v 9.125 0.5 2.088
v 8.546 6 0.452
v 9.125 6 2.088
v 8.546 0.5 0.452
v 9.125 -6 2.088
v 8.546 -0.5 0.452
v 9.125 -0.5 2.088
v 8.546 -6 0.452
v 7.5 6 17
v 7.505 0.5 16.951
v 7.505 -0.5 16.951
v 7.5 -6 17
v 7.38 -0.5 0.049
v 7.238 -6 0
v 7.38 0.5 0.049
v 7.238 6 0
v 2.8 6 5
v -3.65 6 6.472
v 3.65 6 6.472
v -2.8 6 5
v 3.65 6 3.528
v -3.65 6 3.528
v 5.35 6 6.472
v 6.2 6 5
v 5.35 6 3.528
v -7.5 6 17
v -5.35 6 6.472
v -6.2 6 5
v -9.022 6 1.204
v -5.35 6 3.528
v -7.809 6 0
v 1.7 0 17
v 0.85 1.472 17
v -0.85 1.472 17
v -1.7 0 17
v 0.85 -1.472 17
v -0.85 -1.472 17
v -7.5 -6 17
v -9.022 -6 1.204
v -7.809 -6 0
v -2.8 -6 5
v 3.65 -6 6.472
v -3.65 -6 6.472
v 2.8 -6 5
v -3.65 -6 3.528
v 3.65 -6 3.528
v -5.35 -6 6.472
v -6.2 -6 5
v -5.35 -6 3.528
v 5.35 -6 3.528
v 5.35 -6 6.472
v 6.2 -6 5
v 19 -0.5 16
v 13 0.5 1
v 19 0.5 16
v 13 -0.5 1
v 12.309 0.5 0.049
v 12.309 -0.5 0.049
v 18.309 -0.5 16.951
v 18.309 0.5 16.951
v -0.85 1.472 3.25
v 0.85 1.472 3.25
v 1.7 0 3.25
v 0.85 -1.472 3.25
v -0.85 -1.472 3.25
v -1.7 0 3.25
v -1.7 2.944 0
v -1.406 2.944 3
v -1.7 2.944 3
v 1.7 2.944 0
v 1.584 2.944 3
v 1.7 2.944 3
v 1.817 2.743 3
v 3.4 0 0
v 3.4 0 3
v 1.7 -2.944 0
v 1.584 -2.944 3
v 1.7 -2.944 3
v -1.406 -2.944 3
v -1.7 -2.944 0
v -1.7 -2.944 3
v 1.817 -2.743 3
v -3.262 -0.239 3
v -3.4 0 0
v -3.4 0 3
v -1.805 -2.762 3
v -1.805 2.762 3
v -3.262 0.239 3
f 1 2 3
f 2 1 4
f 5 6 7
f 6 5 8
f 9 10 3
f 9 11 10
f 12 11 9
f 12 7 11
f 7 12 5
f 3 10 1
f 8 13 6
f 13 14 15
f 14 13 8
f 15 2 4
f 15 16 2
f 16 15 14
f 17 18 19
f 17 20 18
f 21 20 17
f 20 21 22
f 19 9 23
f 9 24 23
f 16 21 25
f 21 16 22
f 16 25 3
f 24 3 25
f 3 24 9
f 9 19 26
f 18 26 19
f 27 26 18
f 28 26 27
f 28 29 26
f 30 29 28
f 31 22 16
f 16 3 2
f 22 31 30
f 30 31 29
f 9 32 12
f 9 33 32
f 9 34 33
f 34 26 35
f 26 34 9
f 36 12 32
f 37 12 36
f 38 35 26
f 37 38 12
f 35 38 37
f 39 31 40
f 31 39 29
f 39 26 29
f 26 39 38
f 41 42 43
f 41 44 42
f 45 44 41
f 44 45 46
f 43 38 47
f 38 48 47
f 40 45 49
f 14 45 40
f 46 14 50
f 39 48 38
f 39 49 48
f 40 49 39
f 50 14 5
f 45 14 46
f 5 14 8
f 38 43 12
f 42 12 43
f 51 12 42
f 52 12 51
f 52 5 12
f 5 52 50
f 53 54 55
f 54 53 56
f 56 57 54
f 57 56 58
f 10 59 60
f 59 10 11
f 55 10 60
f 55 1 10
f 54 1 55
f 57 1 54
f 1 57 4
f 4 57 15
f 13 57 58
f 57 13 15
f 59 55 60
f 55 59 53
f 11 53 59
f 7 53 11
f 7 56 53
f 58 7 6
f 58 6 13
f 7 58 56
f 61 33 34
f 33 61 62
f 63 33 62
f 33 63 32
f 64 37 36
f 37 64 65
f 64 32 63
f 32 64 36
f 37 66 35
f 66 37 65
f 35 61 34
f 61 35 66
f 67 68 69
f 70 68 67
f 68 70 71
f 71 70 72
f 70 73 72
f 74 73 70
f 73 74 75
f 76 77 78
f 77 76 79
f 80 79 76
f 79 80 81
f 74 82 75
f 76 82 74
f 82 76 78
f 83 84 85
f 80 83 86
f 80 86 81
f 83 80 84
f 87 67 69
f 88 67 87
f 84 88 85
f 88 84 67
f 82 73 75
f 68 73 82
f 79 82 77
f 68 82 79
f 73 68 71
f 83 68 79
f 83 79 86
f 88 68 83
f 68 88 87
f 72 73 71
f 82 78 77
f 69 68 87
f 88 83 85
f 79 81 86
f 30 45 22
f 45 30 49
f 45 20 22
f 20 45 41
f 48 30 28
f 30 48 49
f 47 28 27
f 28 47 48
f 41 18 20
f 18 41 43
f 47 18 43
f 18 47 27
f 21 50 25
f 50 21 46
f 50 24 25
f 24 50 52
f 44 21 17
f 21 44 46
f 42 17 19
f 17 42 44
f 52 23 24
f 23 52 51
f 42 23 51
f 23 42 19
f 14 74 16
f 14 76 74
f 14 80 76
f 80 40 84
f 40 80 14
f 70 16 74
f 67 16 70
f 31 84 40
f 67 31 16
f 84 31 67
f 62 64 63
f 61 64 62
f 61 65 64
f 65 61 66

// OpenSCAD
// file: shapes.scad
// 2D basic shapes
module inverseQuarterCircle(r) {
    difference() {
        square([2*r,2*r]);
        translate([r,r])circle(r=r);
        translate([r,0])square([r,2*r]);
        translate([0,r])square([2*r,r]);
    }
}


module catenary(length=100, width=5, a = 25, step=1) {
    function f(x) = width-(a*cosh(x/length)-a);
    for (i = [-length/2 + step : step : length/2]) {
        //echo("i = ", i, " f(i) = ", f(i));
        polygon([[i-step,0],[i,0],[i,f(i)],[i-step,f(i-step)]]);
    }
}

// 3D basic shapes

module roundedCube(size = [10,10,10],radius=1) {
    hull() {
        // bottom
        translate([size[0]-radius,size[1]-radius,radius])sphere(r=radius,center=true);
        translate([size[0]-radius,radius,radius])sphere(r=radius,center=true);
        translate([radius,size[1]-radius,radius])sphere(r=radius,center=true);
        translate([radius,radius,radius])sphere(r=radius,center=true);
        // top
        translate([size[0]-radius,size[1]-radius,size[2]-radius])sphere(r=radius,center=true);
        translate([size[0]-radius,radius,size[2]-radius])sphere(r=radius,center=true);
        translate([radius,size[1]-radius,size[2]-radius])sphere(r=radius,center=true);
        translate([radius,radius,size[2]-radius])sphere(r=radius,center=true);

    }
}

module roundedCylinder(d, h,rr=1, fn=$fn) {
    translate([0,0,rr])minkowski() {
        cylinder(d=d-2*rr, h=h-2*rr, $fn=fn);
        sphere(r=rr, center = true);
    }
}

module roundedBox(size = [1,1,1],radius=1) {
    hull() {
        translate([size[0]-radius,size[1]-radius,size[2]/2])cylinder(r=radius,h=size[2],center=true);
        translate([size[0]-radius,radius,size[2]/2])cylinder(r=radius,h=size[2],center=true);
        translate([radius,size[1]-radius,size[2]/2])cylinder(r=radius,h=size[2],center=true);
        translate([radius,radius,size[2]/2])cylinder(r=radius,h=size[2],center=true);
    }
}
// file: configuration.scad
print_layer_height = 0.25;
// Using a 623ZZ bearing
bearing_od = 10;
bearing_id = 3;
bearing_h = 4;

m2_dia = 2.4;
m2_nut_dia = 4.5;
m2_nut_slot = 3.9;
m2_nut_height = 2;

m3_dia = 3.4;
m3_nut_dia = 6.8;
m3_nut_slot = 5.8;
m3_nut_height = 3;

m4_dia = 4.5;
m4_nut_dia = 9;
m4_nut_height = 4;

e = 2.718281828;
pi = 3.1415926536;

function cosh(x) = (1 + pow(e, -2 * x)) / (2 * pow(e, -x));

function degtorad(x) = x*pi/180;
// main file
include <configuration.scad>
include <shapes.scad>


module deltaArmConnector() {
    width = 15;
    height = 12;
    wall_thickness = 2.5;
    interruptor_thickness = 1;
    // angle is based on delta arm dimesions
    angle = atan2((32 - width)/2, 90-12);
    difference() {
        union() {
            // base
            translate([0,-height/2,17])rotate([-90,0,0])hull() {
                translate([-width/2, 0, 0])cube([width, 1,height]);
                translate([-width/2, 0, 0])rotate([0,0,angle])translate([2,15,0])cylinder(r=2, h = height);
                translate([width/2, 0, 0])rotate([0,0,-angle])translate([-2,15,0])cylinder(r=2, h = height);
            }
            // limit switch interruptor
            hull() {
                translate([0,0,16])rotate([90,0,0])cylinder(d=2, h=1, center=true);
                translate([18,0,16])rotate([90,0,0])cylinder(d=2, h=1, center=true);
                translate([0,0,1])rotate([90,0,0])cylinder(d=2, h=1, center=true);
                translate([12,0,1])rotate([90,0,0])cylinder(d=2, h=1, center=true);
            }
        }
        translate([0,-height/2,17])rotate([-90,0,0]) {
            // bearing joint mount
            translate([0,0,height/2])rotate([-90,0,0])cylinder(d=m3_dia, h=20);
            translate([0,14,height/2])rotate([-90,0,0])cylinder(d=m3_nut_dia, h=20, $fn=6);
            // screw holes
            translate([-width/2 + 3, 12, 0])cylinder(d=m3_dia, h=height);
            translate([width/2 - 3, 12, 0])cylinder(d=m3_dia, h=height);
        }
        // slice tiny edge of bottom
        translate([0,0,-1])cube(size=[width+4, height, 2], center=true);
    }
    // print support
    translate([0,-height/2,17])rotate([-90,0,0])translate([0,14-print_layer_height,height/2])rotate([-90,0,0])cylinder(d=m3_nut_dia, h=print_layer_height);
}

//$fs=0.2;

deltaArmConnector();
